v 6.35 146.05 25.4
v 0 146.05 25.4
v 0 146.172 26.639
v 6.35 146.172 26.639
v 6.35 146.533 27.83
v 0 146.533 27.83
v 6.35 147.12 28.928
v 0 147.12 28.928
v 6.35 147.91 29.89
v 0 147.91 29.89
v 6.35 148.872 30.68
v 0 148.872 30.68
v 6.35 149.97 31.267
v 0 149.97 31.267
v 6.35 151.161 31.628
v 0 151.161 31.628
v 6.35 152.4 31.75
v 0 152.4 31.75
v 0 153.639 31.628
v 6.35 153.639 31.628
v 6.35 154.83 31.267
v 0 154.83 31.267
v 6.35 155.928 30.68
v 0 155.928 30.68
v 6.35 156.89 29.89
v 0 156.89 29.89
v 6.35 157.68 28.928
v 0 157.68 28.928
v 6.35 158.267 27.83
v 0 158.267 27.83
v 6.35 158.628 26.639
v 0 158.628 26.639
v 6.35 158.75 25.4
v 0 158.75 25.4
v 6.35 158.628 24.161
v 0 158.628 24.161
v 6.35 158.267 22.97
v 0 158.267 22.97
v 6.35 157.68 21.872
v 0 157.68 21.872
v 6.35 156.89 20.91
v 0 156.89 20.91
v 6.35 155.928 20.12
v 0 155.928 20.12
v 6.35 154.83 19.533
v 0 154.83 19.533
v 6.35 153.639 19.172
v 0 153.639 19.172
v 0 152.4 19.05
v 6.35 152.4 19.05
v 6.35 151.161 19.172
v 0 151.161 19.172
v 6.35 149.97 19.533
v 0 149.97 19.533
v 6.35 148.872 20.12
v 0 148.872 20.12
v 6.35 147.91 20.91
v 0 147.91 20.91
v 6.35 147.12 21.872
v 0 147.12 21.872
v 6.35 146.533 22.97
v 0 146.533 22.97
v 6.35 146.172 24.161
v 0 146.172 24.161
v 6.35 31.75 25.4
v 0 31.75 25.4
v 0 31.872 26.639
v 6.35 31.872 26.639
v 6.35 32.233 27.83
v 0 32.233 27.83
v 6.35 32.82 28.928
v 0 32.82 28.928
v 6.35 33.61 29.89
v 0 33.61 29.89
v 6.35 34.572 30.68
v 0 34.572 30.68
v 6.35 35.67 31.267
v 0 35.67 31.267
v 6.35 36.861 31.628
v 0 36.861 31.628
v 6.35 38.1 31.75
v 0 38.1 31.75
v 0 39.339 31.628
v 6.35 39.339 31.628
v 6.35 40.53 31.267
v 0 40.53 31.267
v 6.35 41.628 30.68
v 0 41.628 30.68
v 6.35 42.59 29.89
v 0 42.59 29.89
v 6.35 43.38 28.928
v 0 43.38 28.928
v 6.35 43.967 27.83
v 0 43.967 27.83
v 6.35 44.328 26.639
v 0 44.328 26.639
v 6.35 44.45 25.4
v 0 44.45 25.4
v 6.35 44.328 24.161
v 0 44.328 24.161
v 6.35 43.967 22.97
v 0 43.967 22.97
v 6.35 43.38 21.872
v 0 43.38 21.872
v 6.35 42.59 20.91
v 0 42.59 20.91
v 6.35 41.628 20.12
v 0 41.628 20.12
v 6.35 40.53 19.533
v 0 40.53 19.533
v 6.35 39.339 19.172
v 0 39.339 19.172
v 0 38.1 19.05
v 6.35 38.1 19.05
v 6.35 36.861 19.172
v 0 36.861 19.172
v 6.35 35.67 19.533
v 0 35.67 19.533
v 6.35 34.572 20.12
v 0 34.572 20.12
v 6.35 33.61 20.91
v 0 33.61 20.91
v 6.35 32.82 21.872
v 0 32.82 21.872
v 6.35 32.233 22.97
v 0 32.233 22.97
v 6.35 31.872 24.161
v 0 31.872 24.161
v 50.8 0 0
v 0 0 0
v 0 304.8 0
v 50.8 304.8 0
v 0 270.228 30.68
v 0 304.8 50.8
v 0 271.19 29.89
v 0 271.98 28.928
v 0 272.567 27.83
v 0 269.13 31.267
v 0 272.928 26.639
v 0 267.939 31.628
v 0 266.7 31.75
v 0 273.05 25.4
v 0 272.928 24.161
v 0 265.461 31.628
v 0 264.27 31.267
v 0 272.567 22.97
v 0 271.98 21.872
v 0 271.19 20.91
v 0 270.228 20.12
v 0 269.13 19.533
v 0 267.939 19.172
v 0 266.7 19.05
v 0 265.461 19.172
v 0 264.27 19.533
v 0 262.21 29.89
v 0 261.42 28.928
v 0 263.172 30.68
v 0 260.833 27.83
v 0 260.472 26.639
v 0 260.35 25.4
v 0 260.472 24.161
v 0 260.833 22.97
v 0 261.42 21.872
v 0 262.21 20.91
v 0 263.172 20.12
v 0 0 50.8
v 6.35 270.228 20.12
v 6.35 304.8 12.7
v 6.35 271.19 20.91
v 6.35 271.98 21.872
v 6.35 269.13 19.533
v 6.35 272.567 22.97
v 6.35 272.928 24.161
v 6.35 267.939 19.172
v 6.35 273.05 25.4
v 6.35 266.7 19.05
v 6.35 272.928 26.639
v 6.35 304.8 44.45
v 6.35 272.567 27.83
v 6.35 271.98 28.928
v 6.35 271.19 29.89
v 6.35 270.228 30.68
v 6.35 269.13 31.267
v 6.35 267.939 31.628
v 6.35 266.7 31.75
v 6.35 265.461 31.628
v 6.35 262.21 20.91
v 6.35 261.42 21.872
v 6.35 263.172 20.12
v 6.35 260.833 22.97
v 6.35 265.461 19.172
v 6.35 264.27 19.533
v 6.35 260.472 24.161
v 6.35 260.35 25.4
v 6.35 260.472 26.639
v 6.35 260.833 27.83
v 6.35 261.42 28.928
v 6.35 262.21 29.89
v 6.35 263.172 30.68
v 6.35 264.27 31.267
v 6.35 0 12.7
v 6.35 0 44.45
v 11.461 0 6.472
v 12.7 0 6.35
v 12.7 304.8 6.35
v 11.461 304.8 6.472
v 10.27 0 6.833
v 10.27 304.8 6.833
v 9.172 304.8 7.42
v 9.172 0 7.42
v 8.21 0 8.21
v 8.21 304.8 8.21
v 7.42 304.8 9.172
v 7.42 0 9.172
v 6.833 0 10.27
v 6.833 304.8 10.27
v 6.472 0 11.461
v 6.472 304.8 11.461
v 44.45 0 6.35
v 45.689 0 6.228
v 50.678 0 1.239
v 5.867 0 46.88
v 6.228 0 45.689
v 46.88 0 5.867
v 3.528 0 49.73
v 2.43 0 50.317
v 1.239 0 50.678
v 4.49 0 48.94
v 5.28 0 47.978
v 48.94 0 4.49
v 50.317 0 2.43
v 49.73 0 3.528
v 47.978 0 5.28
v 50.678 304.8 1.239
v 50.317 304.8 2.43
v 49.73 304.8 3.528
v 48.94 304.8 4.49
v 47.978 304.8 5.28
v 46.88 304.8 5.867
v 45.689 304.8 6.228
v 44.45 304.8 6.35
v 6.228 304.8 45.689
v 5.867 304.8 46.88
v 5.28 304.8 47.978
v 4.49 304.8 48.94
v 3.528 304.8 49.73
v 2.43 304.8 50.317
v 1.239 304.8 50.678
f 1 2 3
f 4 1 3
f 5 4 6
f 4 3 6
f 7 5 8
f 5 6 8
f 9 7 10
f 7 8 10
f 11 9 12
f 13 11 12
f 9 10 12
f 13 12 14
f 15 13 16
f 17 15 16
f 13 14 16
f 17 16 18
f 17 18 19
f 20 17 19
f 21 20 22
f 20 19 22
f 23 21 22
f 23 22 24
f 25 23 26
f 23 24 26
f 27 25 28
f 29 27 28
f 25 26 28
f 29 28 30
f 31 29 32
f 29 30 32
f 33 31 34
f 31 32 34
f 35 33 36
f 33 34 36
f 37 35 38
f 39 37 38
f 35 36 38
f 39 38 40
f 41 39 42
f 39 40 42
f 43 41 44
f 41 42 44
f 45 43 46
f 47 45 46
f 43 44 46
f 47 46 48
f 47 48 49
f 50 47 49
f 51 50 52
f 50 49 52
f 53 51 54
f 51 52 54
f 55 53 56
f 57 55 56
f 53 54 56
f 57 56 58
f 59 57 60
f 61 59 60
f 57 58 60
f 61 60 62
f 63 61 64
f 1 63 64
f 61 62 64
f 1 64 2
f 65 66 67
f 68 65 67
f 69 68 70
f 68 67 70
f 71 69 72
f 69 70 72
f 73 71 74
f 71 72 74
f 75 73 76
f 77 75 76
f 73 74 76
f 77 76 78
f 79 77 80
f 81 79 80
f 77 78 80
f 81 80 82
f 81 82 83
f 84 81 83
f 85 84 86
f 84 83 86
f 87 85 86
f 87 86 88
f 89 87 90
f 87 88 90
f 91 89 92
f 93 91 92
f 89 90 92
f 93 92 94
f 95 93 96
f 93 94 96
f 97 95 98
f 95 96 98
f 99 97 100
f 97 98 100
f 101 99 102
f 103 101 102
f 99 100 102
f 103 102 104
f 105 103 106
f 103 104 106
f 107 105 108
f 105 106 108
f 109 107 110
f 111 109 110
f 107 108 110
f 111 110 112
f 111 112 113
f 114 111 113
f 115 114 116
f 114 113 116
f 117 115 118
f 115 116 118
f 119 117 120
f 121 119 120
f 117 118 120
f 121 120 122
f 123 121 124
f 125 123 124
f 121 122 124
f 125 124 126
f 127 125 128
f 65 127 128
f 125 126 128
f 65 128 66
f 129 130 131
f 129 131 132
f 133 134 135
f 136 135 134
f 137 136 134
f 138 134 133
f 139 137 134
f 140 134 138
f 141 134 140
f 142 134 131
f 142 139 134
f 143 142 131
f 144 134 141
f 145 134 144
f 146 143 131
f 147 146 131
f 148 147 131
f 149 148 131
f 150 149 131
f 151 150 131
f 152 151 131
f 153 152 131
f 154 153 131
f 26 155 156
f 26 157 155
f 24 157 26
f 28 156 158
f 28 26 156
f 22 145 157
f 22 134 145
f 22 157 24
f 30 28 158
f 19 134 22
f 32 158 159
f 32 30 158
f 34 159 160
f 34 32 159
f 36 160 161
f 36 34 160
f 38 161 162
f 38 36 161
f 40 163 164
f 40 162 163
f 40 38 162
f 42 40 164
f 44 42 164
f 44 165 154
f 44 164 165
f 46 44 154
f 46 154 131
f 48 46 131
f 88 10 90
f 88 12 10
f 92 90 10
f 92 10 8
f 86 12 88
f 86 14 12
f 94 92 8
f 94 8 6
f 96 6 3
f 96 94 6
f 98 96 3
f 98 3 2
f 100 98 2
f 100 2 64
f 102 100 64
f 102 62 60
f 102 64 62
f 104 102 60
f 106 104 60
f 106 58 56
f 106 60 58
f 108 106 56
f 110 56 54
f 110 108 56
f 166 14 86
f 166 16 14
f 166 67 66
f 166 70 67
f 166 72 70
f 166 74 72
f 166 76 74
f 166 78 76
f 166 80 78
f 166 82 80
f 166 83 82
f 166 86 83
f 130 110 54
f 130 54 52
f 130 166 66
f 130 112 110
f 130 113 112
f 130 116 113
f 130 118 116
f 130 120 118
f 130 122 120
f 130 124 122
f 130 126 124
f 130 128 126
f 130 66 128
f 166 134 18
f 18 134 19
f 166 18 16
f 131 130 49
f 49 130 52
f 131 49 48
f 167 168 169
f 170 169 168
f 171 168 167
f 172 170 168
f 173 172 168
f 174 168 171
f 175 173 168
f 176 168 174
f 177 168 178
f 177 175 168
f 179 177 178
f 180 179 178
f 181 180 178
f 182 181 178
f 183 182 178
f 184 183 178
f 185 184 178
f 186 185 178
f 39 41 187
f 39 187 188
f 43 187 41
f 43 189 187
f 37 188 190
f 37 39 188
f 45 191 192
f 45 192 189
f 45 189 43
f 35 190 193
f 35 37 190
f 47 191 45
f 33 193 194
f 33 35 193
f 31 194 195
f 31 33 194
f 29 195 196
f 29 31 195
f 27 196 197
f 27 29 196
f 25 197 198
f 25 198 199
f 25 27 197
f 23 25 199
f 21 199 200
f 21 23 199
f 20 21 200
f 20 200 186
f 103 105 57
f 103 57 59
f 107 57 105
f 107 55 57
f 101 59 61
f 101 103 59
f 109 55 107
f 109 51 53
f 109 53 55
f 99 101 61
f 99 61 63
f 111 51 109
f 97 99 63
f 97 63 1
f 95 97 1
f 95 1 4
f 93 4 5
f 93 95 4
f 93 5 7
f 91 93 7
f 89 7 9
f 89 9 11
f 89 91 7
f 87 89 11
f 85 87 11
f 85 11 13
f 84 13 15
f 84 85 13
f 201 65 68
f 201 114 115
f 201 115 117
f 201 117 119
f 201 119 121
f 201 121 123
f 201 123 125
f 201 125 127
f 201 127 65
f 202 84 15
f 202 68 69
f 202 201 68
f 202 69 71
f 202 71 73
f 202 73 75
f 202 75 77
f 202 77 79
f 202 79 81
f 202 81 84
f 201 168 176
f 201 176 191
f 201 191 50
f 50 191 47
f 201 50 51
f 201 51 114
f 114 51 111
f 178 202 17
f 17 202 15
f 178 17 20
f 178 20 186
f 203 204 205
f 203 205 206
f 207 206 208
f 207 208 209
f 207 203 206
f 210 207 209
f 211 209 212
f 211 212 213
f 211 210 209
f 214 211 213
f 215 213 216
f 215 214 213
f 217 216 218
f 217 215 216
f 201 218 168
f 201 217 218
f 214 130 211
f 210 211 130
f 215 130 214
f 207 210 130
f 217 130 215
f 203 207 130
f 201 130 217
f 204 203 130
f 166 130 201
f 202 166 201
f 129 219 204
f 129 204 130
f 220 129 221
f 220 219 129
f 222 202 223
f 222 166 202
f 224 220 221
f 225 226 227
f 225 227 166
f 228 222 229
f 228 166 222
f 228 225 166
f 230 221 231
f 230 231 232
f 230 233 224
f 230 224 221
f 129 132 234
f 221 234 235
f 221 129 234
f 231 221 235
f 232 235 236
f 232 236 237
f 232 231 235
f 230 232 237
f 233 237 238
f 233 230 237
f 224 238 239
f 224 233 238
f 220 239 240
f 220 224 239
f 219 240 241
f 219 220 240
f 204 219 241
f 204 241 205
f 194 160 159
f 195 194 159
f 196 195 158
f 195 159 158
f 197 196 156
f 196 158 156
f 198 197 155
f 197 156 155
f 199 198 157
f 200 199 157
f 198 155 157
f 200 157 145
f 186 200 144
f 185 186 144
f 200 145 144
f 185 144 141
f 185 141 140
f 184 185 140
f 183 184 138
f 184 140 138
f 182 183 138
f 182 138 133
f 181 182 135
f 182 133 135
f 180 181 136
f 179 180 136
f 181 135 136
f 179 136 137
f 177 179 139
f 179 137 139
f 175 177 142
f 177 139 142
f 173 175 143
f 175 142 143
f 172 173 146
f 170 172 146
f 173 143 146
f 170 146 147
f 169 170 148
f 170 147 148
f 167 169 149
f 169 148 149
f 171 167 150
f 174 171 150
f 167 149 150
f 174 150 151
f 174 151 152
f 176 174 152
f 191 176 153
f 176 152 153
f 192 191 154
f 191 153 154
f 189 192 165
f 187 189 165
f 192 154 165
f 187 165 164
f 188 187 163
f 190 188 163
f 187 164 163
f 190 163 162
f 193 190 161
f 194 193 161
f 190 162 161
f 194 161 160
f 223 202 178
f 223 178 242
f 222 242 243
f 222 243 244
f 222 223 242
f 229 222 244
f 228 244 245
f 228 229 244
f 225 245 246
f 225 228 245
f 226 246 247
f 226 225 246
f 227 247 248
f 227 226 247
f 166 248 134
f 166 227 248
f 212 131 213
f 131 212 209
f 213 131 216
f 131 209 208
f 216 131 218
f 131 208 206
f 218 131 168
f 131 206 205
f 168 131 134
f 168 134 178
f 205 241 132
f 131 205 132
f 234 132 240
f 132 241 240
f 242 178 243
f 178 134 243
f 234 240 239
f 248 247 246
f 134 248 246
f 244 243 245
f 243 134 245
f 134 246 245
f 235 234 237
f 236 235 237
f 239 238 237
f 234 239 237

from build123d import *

# Parameters (mm, degrees)
F1_DEPTH = 304.8
F2_R     = 6.35
F3_DEPTH = 6.35
F4_R     = 6.35
F5_DEPTH = 6.35
F6_R     = 6.35
F7_DEPTH = 6.35


with BuildPart() as f1:
    # F0 (on Front) → F1 (new body)
    with BuildSketch(Plane.XZ):
        with BuildLine():
            Line((0, 50.8), (0, 0))
            Line((0, 0), (50.8, 0))
            ThreePointArc((50.8, 0), (48.940128, 4.490128), (44.45, 6.35))
            Line((44.45, 6.35), (12.7, 6.35))
            ThreePointArc((12.7, 6.35), (8.209872, 8.209872), (6.35, 12.7))
            Line((6.35, 12.7), (6.35, 44.45))
            ThreePointArc((6.35, 44.45), (4.490128, 48.940128), (0, 50.8))
        make_face()
    extrude(amount=-F1_DEPTH)

    # F2 (on face) → F3 (cut)
    with BuildSketch(Plane(origin=(0, 0, 0), x_dir=(0, -1, 0), z_dir=(-1, 0, 0))):
        with Locations((-38.1, 25.4)):
            Circle(F2_R)
    extrude(amount=-F3_DEPTH, mode=Mode.SUBTRACT)

    # F4 (on face) → F5 (cut)
    with BuildSketch(Plane(origin=(0, 0, 0), x_dir=(0, -1, 0), z_dir=(-1, 0, 0))):
        with Locations((-266.7, 25.4)):
            Circle(F4_R)
    extrude(amount=-F5_DEPTH, mode=Mode.SUBTRACT)

    # F6 (on face) → F7 (cut)
    with BuildSketch(Plane(origin=(0, 0, 0), x_dir=(0, -1, 0), z_dir=(-1, 0, 0))):
        with Locations((-152.4, 25.4)):
            Circle(F6_R)
    extrude(amount=-F7_DEPTH, mode=Mode.SUBTRACT)


solid = f1.part
